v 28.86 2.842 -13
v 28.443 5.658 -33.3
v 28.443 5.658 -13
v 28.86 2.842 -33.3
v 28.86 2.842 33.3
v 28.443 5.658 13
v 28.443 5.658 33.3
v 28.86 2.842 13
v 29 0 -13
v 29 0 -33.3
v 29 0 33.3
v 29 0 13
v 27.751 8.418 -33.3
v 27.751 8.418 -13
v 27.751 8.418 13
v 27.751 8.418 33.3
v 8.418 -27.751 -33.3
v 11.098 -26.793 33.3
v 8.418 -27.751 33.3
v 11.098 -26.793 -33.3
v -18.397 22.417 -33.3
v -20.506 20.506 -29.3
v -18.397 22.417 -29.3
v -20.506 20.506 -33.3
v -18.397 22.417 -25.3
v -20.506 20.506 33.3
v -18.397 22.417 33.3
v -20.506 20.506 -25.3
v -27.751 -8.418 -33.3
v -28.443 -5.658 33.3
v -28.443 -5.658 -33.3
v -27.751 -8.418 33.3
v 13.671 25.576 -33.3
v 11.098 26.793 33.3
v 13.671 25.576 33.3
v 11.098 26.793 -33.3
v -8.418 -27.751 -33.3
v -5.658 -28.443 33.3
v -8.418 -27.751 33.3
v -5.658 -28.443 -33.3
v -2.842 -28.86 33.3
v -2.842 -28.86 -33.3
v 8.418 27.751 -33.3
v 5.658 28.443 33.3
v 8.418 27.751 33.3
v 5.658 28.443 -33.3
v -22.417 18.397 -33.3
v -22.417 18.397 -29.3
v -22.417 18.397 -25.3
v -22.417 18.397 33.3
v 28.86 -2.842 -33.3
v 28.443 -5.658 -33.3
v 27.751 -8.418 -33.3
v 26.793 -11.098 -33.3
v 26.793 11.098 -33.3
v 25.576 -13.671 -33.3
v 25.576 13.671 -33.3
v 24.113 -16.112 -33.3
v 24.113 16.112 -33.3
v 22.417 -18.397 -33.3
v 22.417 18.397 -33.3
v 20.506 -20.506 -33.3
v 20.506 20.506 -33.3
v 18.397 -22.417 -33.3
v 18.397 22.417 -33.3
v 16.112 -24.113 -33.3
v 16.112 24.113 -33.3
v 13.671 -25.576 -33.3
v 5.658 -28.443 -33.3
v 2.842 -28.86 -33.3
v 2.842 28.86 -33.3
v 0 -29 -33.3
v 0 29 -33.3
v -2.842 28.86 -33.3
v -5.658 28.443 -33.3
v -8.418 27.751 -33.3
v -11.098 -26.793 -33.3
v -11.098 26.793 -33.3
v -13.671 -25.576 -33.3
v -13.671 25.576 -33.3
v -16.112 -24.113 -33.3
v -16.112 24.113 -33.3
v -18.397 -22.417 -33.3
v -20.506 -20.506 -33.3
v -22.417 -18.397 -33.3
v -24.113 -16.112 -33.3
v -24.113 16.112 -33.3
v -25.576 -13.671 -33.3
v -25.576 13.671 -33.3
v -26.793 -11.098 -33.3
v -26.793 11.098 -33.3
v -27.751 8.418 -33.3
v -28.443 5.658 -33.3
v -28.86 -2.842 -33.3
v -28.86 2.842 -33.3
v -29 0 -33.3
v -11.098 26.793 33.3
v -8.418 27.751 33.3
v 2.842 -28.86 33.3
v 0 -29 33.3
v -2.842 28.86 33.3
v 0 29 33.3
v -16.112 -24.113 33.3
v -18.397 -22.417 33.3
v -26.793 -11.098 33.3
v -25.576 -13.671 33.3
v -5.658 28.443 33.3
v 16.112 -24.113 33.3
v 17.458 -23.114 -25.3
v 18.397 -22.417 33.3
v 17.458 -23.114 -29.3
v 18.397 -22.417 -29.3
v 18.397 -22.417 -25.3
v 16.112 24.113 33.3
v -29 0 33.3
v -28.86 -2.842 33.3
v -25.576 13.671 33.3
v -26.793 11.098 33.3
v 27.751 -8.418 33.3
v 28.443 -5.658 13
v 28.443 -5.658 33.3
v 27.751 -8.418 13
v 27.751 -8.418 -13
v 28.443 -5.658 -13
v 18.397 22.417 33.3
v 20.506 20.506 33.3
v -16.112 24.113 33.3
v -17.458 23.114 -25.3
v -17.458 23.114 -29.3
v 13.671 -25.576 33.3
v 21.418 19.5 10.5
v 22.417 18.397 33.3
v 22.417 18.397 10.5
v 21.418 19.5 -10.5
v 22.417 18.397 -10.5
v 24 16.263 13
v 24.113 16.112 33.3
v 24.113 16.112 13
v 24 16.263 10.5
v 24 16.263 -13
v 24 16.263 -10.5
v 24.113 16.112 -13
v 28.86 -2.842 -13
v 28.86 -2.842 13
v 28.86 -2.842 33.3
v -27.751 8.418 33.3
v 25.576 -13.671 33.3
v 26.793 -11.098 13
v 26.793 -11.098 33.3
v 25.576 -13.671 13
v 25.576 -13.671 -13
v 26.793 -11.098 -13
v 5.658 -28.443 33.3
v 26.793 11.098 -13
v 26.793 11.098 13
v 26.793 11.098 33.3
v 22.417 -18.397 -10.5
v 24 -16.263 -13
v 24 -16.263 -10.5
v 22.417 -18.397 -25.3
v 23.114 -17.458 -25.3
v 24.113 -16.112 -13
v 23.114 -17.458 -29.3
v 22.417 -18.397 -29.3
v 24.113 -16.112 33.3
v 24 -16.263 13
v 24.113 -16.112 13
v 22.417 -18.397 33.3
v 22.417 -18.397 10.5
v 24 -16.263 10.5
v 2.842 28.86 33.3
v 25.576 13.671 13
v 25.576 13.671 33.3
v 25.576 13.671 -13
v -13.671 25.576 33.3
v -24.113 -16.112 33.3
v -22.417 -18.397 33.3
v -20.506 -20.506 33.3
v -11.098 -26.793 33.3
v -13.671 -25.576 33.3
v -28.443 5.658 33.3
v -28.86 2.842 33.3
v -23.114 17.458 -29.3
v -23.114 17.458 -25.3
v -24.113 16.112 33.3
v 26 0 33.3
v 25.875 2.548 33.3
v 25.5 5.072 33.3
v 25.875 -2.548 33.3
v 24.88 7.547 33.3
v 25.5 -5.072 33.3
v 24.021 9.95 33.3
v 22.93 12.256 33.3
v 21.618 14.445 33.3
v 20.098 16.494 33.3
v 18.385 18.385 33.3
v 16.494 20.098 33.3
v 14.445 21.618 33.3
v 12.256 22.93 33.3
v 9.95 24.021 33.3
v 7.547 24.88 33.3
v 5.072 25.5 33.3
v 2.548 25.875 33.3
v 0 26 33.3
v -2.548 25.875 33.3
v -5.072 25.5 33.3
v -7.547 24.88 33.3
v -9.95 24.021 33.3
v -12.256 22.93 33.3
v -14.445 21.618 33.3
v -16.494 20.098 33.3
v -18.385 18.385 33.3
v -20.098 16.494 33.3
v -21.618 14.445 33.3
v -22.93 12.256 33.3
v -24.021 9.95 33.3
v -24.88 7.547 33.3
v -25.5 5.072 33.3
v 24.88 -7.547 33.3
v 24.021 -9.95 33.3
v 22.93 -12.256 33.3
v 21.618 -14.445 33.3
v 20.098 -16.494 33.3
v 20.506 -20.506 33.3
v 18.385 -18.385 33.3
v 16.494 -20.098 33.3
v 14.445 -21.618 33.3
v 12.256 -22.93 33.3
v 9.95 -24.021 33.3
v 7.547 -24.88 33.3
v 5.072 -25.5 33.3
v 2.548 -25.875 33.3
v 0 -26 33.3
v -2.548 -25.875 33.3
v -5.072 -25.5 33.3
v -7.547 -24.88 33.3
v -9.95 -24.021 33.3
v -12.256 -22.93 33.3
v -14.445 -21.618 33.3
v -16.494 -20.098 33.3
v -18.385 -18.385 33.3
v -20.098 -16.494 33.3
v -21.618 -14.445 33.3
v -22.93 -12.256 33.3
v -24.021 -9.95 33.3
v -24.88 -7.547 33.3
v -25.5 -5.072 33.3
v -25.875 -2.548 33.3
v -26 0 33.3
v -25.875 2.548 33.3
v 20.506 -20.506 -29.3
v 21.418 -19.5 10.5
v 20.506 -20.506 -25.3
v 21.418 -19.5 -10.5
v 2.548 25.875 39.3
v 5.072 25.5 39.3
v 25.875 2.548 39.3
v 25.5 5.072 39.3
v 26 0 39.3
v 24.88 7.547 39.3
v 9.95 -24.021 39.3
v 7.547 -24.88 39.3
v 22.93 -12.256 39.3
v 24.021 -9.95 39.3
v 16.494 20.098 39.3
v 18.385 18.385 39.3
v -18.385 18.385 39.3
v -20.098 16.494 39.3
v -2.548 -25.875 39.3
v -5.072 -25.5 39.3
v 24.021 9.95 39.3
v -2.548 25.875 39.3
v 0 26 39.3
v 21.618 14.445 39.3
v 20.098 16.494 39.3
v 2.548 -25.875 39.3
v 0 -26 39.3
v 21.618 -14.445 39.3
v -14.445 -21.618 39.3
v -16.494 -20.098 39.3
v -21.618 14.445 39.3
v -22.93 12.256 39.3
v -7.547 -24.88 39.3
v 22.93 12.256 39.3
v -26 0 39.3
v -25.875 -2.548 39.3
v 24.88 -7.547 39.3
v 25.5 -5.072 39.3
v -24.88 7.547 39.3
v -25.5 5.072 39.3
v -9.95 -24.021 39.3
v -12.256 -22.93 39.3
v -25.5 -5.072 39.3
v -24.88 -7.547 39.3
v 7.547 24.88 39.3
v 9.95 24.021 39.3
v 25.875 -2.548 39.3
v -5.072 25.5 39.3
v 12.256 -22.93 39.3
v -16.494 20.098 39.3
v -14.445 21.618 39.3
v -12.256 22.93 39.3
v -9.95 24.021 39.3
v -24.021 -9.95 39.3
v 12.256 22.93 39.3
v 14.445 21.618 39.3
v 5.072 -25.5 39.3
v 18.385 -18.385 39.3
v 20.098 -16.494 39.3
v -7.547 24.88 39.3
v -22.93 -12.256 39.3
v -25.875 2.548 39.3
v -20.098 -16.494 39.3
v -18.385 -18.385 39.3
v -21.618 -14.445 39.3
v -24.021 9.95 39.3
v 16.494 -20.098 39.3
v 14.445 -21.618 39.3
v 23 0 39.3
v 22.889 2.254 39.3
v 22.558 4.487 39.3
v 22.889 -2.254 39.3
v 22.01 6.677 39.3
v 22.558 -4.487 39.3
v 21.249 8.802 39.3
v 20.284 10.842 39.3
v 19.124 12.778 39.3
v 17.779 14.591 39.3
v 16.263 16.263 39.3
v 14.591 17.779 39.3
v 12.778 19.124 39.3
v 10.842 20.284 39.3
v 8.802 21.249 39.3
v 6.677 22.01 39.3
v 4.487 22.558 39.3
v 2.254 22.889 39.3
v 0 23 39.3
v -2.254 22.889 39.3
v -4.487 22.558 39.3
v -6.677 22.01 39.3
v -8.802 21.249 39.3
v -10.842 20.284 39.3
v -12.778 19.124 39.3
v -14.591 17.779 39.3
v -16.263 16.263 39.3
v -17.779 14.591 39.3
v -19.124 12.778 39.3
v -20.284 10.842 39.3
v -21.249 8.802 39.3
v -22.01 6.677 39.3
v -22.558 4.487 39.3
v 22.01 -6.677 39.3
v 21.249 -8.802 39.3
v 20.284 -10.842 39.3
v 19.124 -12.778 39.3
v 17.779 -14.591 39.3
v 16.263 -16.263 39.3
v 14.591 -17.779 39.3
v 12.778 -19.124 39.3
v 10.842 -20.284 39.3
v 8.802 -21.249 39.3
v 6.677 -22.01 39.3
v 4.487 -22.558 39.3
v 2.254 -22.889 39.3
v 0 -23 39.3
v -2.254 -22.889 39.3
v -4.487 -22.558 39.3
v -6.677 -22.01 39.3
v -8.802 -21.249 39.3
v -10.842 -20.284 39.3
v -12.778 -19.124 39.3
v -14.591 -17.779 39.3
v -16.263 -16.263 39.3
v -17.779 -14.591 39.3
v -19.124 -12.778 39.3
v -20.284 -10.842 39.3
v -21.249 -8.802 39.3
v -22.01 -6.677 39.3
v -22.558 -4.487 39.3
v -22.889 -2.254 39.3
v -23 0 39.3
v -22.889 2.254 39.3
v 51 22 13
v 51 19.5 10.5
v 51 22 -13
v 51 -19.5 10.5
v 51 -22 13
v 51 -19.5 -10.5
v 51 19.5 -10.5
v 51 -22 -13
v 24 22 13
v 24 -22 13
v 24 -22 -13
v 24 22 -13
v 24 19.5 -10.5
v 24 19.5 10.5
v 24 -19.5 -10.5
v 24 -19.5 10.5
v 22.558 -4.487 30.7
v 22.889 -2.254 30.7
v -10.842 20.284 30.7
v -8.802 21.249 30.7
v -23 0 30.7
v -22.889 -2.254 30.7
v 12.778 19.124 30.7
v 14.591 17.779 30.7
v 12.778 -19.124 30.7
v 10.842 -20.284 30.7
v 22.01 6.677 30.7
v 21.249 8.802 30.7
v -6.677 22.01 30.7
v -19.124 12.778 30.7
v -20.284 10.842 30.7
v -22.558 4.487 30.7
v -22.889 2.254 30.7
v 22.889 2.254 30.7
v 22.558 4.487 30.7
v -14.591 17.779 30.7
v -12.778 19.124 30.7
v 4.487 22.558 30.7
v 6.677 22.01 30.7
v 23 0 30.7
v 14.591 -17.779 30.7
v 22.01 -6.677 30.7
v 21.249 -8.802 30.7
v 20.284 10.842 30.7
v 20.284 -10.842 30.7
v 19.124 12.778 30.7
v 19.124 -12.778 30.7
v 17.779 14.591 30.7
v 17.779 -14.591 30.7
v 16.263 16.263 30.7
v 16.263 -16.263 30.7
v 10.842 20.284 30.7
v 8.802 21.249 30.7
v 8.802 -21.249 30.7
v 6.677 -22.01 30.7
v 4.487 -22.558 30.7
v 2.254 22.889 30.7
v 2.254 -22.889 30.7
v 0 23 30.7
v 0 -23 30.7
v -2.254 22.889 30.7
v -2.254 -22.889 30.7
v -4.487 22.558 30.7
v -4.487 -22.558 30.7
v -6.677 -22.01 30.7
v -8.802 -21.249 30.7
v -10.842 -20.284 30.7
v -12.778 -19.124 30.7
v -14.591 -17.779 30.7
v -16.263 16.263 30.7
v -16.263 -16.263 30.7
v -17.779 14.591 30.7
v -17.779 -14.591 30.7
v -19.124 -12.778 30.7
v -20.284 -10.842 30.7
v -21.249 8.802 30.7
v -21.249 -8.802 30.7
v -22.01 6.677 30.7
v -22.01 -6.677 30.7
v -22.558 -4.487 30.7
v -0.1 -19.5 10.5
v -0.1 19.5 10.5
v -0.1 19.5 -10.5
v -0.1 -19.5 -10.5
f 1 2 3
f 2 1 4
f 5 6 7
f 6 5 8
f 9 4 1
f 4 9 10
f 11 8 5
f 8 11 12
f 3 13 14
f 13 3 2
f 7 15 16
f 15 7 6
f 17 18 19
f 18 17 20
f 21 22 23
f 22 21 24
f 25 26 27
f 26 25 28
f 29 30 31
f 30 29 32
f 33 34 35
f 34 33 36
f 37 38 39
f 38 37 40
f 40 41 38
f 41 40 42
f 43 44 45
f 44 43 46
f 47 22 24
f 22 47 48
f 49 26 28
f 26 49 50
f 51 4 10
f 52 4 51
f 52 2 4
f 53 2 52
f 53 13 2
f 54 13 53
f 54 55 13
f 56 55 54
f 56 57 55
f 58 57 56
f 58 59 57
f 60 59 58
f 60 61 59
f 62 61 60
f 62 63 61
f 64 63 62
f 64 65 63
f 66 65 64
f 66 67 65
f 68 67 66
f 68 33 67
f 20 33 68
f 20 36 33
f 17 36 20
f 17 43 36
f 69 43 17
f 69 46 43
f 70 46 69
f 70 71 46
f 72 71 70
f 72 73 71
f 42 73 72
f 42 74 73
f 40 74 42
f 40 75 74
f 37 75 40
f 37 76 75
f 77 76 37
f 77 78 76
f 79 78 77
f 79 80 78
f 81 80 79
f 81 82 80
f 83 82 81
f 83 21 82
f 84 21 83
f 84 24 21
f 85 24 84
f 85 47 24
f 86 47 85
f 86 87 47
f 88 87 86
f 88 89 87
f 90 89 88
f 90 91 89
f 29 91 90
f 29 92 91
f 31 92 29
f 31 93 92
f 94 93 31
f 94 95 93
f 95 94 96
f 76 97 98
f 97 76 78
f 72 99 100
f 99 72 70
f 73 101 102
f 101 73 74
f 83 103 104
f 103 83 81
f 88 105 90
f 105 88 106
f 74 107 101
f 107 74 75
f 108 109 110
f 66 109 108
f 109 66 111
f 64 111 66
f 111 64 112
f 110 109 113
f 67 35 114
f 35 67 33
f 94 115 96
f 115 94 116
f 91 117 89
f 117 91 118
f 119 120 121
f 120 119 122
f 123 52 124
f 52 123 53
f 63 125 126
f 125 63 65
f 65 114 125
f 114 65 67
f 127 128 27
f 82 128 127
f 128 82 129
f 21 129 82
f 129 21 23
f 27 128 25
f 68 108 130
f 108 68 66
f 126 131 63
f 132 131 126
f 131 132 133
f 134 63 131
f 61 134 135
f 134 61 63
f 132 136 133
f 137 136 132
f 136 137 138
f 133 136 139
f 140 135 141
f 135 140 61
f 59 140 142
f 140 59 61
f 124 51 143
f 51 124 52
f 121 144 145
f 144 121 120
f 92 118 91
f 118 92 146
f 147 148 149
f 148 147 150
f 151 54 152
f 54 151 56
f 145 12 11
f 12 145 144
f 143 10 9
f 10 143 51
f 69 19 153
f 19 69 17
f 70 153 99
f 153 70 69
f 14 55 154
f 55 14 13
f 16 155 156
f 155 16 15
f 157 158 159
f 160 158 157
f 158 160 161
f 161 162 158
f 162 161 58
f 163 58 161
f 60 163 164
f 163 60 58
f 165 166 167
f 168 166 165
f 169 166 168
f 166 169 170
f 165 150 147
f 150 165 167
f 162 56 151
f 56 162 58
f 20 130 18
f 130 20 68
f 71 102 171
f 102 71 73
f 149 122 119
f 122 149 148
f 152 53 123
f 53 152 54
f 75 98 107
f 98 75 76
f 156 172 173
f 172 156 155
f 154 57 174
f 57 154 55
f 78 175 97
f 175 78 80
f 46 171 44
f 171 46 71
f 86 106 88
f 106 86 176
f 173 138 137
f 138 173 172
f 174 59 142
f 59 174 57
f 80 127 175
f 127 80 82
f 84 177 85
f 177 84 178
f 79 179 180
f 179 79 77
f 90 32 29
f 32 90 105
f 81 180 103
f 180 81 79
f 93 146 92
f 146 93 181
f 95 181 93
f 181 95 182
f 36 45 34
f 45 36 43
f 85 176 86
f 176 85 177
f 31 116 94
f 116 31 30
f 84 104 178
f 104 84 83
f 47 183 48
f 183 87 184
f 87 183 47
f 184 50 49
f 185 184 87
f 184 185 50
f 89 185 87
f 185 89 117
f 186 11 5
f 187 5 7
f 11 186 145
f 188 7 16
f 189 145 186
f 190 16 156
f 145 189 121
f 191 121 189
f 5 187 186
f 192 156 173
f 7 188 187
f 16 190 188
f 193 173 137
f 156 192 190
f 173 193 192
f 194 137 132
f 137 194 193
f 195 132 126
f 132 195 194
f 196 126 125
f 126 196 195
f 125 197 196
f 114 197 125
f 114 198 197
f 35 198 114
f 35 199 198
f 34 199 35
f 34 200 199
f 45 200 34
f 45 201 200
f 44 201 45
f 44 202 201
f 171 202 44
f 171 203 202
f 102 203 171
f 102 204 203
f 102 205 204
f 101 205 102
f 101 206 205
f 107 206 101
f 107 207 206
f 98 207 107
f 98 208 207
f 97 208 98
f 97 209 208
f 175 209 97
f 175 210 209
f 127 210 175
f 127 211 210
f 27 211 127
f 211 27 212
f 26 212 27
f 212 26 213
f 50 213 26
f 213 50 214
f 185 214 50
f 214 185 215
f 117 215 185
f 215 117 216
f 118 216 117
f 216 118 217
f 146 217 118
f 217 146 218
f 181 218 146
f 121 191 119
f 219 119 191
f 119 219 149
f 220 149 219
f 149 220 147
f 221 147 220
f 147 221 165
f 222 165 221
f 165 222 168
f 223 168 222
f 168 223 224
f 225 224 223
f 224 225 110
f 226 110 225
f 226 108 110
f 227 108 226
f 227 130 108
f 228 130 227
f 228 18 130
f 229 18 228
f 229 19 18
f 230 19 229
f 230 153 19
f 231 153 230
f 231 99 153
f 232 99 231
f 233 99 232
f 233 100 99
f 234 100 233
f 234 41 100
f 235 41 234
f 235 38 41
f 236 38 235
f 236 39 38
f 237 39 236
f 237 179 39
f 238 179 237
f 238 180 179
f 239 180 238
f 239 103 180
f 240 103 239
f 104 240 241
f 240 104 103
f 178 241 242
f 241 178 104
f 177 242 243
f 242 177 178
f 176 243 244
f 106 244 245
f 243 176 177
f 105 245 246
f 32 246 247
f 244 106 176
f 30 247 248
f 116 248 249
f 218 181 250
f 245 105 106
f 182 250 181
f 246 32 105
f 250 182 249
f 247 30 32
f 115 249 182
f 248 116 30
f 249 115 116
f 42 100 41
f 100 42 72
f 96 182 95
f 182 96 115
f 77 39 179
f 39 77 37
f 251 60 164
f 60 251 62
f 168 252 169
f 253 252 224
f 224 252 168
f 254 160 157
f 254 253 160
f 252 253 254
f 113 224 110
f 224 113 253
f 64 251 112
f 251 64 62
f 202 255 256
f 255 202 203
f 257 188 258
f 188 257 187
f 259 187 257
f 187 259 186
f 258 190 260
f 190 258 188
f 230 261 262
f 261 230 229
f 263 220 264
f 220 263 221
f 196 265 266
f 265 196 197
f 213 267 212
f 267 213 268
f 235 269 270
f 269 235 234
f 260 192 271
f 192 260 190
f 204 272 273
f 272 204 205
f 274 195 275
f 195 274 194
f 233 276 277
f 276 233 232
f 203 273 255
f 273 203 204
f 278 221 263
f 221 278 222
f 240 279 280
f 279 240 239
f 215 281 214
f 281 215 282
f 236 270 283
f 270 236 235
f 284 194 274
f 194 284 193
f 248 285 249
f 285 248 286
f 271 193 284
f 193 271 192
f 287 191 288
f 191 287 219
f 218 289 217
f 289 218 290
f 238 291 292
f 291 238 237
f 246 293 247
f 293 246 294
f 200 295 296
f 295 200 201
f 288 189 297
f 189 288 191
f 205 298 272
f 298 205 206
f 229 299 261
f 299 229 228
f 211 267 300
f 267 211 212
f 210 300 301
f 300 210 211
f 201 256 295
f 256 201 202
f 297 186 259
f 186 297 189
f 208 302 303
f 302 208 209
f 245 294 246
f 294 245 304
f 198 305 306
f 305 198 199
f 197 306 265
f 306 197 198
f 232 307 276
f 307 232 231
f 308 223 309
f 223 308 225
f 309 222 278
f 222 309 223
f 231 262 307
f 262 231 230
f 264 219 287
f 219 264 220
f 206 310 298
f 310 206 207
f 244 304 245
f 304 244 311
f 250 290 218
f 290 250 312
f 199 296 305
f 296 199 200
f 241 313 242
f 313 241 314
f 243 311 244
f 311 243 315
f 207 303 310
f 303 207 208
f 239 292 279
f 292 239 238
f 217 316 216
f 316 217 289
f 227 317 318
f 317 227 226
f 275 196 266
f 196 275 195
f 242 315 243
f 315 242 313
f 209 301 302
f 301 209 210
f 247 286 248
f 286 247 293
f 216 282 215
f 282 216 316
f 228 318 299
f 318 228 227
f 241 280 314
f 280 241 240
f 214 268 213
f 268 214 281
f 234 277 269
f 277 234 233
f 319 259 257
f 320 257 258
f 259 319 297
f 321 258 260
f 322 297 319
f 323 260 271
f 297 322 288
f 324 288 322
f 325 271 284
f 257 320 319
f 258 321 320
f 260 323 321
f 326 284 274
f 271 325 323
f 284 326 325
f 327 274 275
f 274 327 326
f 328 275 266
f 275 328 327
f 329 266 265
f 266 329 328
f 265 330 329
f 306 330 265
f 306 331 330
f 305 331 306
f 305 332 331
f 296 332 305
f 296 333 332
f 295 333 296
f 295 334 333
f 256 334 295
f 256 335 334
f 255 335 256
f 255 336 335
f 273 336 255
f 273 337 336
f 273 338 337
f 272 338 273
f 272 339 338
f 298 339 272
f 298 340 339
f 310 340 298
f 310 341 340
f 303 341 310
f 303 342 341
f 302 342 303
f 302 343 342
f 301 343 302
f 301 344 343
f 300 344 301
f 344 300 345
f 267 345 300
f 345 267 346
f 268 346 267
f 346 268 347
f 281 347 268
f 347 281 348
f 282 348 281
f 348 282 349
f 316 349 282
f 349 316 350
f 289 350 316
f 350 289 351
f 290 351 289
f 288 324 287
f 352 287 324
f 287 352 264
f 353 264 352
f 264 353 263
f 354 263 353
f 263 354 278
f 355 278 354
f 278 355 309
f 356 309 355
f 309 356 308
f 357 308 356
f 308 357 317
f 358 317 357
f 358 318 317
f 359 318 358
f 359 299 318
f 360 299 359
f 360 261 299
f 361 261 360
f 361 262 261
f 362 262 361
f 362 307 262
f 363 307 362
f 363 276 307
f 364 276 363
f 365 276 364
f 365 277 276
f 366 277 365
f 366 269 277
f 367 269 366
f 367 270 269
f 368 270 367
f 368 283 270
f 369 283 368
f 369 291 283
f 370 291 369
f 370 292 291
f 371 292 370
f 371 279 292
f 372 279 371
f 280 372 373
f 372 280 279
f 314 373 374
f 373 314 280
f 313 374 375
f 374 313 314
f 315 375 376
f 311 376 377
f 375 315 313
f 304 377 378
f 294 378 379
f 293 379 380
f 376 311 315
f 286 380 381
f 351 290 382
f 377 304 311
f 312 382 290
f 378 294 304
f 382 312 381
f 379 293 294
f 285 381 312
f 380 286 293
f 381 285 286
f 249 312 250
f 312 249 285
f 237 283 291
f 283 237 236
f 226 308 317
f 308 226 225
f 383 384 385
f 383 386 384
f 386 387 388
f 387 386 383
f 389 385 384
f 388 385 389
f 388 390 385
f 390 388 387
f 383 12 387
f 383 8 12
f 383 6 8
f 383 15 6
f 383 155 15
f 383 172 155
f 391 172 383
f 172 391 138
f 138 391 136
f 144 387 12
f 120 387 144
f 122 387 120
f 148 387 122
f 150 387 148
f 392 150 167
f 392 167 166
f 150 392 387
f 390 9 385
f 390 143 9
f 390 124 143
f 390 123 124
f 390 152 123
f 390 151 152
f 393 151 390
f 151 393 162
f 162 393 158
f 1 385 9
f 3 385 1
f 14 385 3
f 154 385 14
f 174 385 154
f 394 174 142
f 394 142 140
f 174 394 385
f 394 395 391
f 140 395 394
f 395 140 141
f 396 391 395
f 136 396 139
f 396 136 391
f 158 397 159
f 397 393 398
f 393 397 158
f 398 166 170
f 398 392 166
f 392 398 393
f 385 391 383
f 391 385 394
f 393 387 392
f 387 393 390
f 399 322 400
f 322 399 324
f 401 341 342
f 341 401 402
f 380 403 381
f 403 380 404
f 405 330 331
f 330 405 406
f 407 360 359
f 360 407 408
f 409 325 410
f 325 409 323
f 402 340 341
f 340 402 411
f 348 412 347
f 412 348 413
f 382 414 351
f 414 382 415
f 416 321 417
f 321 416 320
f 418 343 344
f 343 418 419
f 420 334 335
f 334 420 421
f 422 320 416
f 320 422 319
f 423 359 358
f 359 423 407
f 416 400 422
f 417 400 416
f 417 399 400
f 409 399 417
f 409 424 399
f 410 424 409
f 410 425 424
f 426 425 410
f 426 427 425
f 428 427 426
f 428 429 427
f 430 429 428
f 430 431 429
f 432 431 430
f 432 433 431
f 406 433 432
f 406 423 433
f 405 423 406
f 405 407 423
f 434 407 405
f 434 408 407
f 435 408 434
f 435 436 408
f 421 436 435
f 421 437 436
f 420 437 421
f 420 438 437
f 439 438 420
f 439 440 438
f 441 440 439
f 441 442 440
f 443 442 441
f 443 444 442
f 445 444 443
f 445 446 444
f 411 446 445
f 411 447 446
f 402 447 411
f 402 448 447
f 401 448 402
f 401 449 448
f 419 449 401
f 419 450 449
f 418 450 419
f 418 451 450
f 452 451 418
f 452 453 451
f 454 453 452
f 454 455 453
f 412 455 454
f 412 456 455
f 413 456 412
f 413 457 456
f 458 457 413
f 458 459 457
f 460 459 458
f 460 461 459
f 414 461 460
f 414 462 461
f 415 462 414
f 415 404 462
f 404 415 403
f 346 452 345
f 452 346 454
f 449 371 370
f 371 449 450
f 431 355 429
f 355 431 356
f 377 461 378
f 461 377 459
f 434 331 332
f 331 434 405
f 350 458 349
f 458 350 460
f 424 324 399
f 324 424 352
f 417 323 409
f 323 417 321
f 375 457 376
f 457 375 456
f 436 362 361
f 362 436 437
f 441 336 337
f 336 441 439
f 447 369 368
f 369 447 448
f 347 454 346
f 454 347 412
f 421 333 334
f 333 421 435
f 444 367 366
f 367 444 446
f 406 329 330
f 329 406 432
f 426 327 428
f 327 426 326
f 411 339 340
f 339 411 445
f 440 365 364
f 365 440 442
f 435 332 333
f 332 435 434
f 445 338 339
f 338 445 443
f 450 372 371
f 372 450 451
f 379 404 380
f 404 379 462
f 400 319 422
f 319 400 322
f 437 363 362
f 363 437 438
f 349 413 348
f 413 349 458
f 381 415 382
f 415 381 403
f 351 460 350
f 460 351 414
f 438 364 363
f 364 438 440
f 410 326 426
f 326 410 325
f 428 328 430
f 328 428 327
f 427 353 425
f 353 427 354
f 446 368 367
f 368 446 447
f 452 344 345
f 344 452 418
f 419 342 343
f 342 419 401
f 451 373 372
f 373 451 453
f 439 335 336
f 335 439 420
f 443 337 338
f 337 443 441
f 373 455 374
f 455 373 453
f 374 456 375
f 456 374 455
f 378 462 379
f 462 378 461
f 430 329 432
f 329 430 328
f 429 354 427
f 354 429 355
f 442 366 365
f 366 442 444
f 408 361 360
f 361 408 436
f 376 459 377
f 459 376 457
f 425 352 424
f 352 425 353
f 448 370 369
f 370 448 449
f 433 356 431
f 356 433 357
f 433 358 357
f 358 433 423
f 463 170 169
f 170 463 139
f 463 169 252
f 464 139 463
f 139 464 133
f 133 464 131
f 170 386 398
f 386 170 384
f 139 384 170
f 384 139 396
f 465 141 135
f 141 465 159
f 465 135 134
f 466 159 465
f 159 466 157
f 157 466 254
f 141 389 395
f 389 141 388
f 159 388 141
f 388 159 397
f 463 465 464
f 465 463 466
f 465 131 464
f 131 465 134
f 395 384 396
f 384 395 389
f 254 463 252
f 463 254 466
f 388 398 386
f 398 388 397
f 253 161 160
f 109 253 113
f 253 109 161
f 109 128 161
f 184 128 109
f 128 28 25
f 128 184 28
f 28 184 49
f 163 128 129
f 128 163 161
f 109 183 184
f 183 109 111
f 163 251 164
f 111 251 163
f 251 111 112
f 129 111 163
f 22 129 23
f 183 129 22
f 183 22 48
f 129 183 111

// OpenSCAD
// =============================================================================
// Dock Auto-Empty Suction Fan — CANDIDATE-PARAMETRIC model (3 presets)
// =============================================================================
// BOM.md Dock table "Auto-empty suction fan | $10-20 | 21.6-25.2V 65mm 350W |
// ... BLDC motor Nidec 13F704P640, non-Nidec 64XC216-085D, MBD65" (verbatim,
// upstream main 9f79e39, re-read 2026-09-11).
//
// 2026-09-11 REBUILD. The 2026-08-19 revision of this file was a single
// ALL-(estimate) generic class draft. This revision keeps that draft as the
// `legacy_generic` preset and adds TWO SOURCE-ANCHORED candidate presets whose
// key dims are quoted from primary vendor documents fetched & read 2026-09-11:
//
// SOURCE 1 — Nidec, "Blower line-up for Vacuum Cleaner Ver.16C", 2021-05-06,
//   Nidec China PingHu R&D, 46 pp. (URL as cited in merged upstream PR #64,
//   contributions/part-specs/serengon/auto-empty-fan/README.md; PDF text
//   extracted this run from https://file.kuyodo.com/...Ver.16C.pdf):
//   - p.29 product table row V55: "Size (mm) Φ58xL63.3/66.6", efficiency 53%,
//     "Target Input Power (W) ... 250 / 350", weight 175/195 g — the 350 W /
//     ~65 mm-class row the BOM describes. Side-arm length 63.3, axial-arm
//     66.6 (p.9 out-line: "63.33 66.63", Phi58).
//   - p.29 also lists the full 2021 family (V45 thru V55W) — see
//     MEASURE-ME.md section 20 candidate table.
//   - Control interface (pp.20-22): VBAT / PGND power plus PWM / FG / EN on
//     JST BM03B-GHS-TBT; PWM IN 0-5.5 V 1 kHz high-active; FG out open
//     collector, "FG [Hz] = Speed [rpm] / 60"; start order VM=>EN=>PWM.
//     -> a BL-V55-class unit is a 5-lead SMART motor (driver on board).
//
// SOURCE 2 — BG Motor (china-bgmotor.com) BLDC vacuum-motor catalogue + BG26
//   product page (both fetched 2026-09-11):
//   - BG26 listing: "Range of Power:100W-300W / Range of Voltage:22.2V / Max
//     Air Flow:80m³/h / Maximum Vacuum Presure:22.5Kpa / Weight: 0.26kg /
//     Fan System:Through Flow", title "2.6 inch" (2.6 in = 66 mm).
//   - BG26 page "Motor Technical Data" curves (verbatim):
//     BG26-350FX01 curve 1: 22.2 V, 350 W, 80 m3/h, 22.5 kPa, 90,000 rpm, 86 dB
//     BG26-350FX01 curve 2: 150 W, 61.9 m3/h, 12 kPa, 68,000 rpm
//     BG26-100FX01  curve 3: 100 W, 51 m3/h, 8 kPa, 55,000 rpm
//   - BG26 page spec table: 3 phases, CW/CCW, insulation class F, IP00,
//     noise <=90 dB, "Work Condition S1.S2.S3".
//   - BG26 page "Mechanical Dimensions" drawing OCR this run (rapidocr, values
//     conf >=0.99): 061.0 / 064.2 / 065.0 / 067.4 (diameter callouts, mapping
//     NOT labeled in OCR), "53.3±0.30", "71.1±0.50", "3.8" (shaft logic,
//     unconfirmed), silkscreen "DC+(红色) DC-(黑色)" = TWO power leads only ->
//     speed control lives in an EXTERNAL driver, unlike the Nidec unit.
//   - BG36 listing (same catalogue): 350 W, 24 V, 71.4 m3/h, 17 kPa, 0.90 kg,
//     "Tangential By Pass", title 3.6 inch (= 91 mm) — corroborates the
//     upstream PR #64 candidates table; NOT modeled here (too big for the
//     65 mm BOM class, listed for completeness).
//
// PROVENANCE TAGS (dims-tally.py audited):
//   [M] = quoted VERBATIM from a fetched primary source above (vendor-
//         published; still verify against the physical part when in hand)
//   [E] + "estimate" = provenance-less filler needed to make the envelope
//         solid; refine from the real unit (MEASURE-ME.md section 20)
//
// STILL UNKNOWN for every candidate: retention (row 10), inlet/outlet port
// geometry as manufactured, mounting features. The geometry below is a
// SPACE-RESERVATION envelope per candidate, not a manufacturable model.
// Units: mm. Author: OsakaTX. License: CC BY-SA 4.0

/* [Hidden] */
$fn = 64;

/* [Candidate selection] */
// nidec_blv55  = Nidec BL-V55 350 W-class (Source 1)
// bg26         = BG26 150-350 W-class  (Source 2)
// legacy_generic = 2026-08-19 all-(estimate) class draft, kept for history
part = "nidec_blv55"; // [nidec_blv55, bg26, legacy_generic]

/* [Shared derived] */
wall_t = 2.5;     // [E] (estimate) scroll/body wall, all candidates
duct_overlap = 5; // [E] (estimate) outlet-duct overlap INTO the body
inlet_h    = 6;   // [E] (estimate) inlet boss height above +Z face
wire_exit_deg = 45; // [E] (estimate) wire-slot angle
wire_w = 8;       // [E] (estimate)
wire_h = 4;       // [E] (estimate)

// ---------------------------------------------------------------------------
// Candidate dimension sets. Body/inlet bore values per source; outlet duct &
// wall details remain estimates for ALL candidates (no port drawing captured).
// ---------------------------------------------------------------------------

// Nidec BL-V55 (axial-arm 66.6 variant; side-arm 63.3 alternate — flip
// body_len if the sourced unit is the side-arm type):
//   body_d  58 [M deck p.29 "Φ58xL63.3/66.6"]
//   body_l  66.6 [M same]
//   inlet_id / inlet_od / outlet dims [E]
// BG26:
//   body_d  65.0 [M OCR "065.0" — also matches "2.6 inch" title]
//   body_l  71.1 [M OCR "71.1±0.50" read as the axial extent; alt mapping:
//           53.3±0.30 may be the body length and 71.1 the incl.-flange
//           height — UNRESOLVED, see MEASURE-ME section 20 addendum]
//   flange circle 67.4 [M OCR] modeled as inlet boss OD; 61.0/64.2/65.0
//   circles and 3.8 shaft callout left as notes (mapping unconfirmed).
//   inlet_id / outlet dims [E]
// legacy_generic: the 2026-08-19 values, unchanged, all [E] but body_d 65
//   which is BOM-asserted "65mm" (still unmeasured by hand).

module candidate_dims(choice) {
    // one branch per preset; keeps every magic number on ONE line
    if (choice == "nidec_blv55") {
        blower(58,                          // body_d  [M] deck p.29
               66.6,                        // body_l  [M] axial-arm variant
               46, 52,                      // inlet id/od [E]
               44, 26, 22);                 // outlet w/h/len [E]
    } else if (choice == "bg26") {
        blower(65,                          // body_d  [M] OCR / "2.6in"
               71.1,                        // body_l  [M] OCR (mapping TBD)
               55, 67.4,                    // inlet id [E] / boss od [M OCR]
               48, 28, 20);                 // outlet w/h/len [E]
    } else { // legacy_generic — 2026-08-19 estimates + BOM "65mm"
        blower(65, 95, 52, 58, 42, 28, 25);
    }
}
module blower(body_d, body_l, inlet_id, inlet_od, out_w, out_h, out_len) {
    can_r      = body_d / 2;
    inlet_r    = inlet_id / 2;
    out_ch_w   = out_w - 2 * wall_t;   // inner channel width
    out_ch_h   = out_h - 2 * wall_t;   // inner channel height

    difference() {
        union() {
            cylinder(h = body_l, r = can_r, center = true);      // main can
            translate([0, 0, body_l / 2])
                cylinder(h = inlet_h, r = inlet_od / 2);          // inlet boss
            translate([can_r - duct_overlap, -out_w / 2, -out_h / 2])
                cube([out_len + duct_overlap, out_w, out_h]);     // outlet duct
        }
        // axial inlet bore through boss + front wall
        translate([0, 0, body_l / 2 - wall_t - 0.1])
            cylinder(h = inlet_h + wall_t + 0.2, r = inlet_r);
        // rectangular outlet channel out through the wall + duct
        translate([-0.1, -out_ch_w / 2, -out_ch_h / 2])
            cube([can_r + out_len + 0.2, out_ch_w, out_ch_h]);
        // wire-exit slot near the -Z end
        rotate([0, 0, wire_exit_deg])
            translate([0, 0, -body_l / 2 + 6])
                cube([wire_w, 2 * (can_r + 1), wire_h], center = true);
    }
}

module candidate_dims(choice) {
    // one branch per preset; keeps every magic number on ONE line
    if (choice == "nidec_blv55") {
        blower(58,                          // body_d  [M] deck p.29
               66.6,                        // body_l  [M] axial-arm variant
               46, 52,                      // inlet id/od [E]
               44, 26, 22);                 // outlet w/h/len [E]
    } else if (choice == "bg26") {
        blower(65,                          // body_d  [M] OCR / "2.6in"
               71.1,                        // body_l  [M] OCR (mapping TBD)
               55, 67.4,                    // inlet id [E] / boss od [M OCR]
               48, 28, 20);                 // outlet w/h/len [E]
    } else { // legacy_generic — 2026-08-19 estimates + BOM "65mm"
        blower(65, 95, 52, 58, 42, 28, 25);
    }
}

module dock_auto_empty_fan(choice = part) {
    candidate_dims(choice);
}

// Envelope blockout for chassis space checks (per candidate, incl. boss/duct)
// span_y = axial (body + inlet boss), span_x/span_z = transverse (body + duct)
module dock_auto_empty_fan_envelope(choice = part) {
    if (choice == "nidec_blv55") {
        env_cube(58, 66.6, 22, 26);
    } else if (choice == "bg26") {
        env_cube(65, 71.1, 20, 28);
    } else {
        env_cube(65, 95, 25, 28);
    }
}

module env_cube(body_d, body_l, duct_len, duct_h) {
    // axial: body + inlet boss; transverse: max(room for boss 0, duct);
    // vertical: body OD + room for the outlet channel face half-height.
    cube([body_l + inlet_h,
          body_d + duct_len,
          body_d + max(inlet_h, duct_h / 2 - wall_t)],
         center = true);
}

/* [Render] */
dock_auto_empty_fan();
// dock_auto_empty_fan("bg26");
// dock_auto_empty_fan("legacy_generic");
// dock_auto_empty_fan_envelope();
// dock_auto_empty_fan_envelope("bg26");
// dock_auto_empty_fan_envelope("legacy_generic");
